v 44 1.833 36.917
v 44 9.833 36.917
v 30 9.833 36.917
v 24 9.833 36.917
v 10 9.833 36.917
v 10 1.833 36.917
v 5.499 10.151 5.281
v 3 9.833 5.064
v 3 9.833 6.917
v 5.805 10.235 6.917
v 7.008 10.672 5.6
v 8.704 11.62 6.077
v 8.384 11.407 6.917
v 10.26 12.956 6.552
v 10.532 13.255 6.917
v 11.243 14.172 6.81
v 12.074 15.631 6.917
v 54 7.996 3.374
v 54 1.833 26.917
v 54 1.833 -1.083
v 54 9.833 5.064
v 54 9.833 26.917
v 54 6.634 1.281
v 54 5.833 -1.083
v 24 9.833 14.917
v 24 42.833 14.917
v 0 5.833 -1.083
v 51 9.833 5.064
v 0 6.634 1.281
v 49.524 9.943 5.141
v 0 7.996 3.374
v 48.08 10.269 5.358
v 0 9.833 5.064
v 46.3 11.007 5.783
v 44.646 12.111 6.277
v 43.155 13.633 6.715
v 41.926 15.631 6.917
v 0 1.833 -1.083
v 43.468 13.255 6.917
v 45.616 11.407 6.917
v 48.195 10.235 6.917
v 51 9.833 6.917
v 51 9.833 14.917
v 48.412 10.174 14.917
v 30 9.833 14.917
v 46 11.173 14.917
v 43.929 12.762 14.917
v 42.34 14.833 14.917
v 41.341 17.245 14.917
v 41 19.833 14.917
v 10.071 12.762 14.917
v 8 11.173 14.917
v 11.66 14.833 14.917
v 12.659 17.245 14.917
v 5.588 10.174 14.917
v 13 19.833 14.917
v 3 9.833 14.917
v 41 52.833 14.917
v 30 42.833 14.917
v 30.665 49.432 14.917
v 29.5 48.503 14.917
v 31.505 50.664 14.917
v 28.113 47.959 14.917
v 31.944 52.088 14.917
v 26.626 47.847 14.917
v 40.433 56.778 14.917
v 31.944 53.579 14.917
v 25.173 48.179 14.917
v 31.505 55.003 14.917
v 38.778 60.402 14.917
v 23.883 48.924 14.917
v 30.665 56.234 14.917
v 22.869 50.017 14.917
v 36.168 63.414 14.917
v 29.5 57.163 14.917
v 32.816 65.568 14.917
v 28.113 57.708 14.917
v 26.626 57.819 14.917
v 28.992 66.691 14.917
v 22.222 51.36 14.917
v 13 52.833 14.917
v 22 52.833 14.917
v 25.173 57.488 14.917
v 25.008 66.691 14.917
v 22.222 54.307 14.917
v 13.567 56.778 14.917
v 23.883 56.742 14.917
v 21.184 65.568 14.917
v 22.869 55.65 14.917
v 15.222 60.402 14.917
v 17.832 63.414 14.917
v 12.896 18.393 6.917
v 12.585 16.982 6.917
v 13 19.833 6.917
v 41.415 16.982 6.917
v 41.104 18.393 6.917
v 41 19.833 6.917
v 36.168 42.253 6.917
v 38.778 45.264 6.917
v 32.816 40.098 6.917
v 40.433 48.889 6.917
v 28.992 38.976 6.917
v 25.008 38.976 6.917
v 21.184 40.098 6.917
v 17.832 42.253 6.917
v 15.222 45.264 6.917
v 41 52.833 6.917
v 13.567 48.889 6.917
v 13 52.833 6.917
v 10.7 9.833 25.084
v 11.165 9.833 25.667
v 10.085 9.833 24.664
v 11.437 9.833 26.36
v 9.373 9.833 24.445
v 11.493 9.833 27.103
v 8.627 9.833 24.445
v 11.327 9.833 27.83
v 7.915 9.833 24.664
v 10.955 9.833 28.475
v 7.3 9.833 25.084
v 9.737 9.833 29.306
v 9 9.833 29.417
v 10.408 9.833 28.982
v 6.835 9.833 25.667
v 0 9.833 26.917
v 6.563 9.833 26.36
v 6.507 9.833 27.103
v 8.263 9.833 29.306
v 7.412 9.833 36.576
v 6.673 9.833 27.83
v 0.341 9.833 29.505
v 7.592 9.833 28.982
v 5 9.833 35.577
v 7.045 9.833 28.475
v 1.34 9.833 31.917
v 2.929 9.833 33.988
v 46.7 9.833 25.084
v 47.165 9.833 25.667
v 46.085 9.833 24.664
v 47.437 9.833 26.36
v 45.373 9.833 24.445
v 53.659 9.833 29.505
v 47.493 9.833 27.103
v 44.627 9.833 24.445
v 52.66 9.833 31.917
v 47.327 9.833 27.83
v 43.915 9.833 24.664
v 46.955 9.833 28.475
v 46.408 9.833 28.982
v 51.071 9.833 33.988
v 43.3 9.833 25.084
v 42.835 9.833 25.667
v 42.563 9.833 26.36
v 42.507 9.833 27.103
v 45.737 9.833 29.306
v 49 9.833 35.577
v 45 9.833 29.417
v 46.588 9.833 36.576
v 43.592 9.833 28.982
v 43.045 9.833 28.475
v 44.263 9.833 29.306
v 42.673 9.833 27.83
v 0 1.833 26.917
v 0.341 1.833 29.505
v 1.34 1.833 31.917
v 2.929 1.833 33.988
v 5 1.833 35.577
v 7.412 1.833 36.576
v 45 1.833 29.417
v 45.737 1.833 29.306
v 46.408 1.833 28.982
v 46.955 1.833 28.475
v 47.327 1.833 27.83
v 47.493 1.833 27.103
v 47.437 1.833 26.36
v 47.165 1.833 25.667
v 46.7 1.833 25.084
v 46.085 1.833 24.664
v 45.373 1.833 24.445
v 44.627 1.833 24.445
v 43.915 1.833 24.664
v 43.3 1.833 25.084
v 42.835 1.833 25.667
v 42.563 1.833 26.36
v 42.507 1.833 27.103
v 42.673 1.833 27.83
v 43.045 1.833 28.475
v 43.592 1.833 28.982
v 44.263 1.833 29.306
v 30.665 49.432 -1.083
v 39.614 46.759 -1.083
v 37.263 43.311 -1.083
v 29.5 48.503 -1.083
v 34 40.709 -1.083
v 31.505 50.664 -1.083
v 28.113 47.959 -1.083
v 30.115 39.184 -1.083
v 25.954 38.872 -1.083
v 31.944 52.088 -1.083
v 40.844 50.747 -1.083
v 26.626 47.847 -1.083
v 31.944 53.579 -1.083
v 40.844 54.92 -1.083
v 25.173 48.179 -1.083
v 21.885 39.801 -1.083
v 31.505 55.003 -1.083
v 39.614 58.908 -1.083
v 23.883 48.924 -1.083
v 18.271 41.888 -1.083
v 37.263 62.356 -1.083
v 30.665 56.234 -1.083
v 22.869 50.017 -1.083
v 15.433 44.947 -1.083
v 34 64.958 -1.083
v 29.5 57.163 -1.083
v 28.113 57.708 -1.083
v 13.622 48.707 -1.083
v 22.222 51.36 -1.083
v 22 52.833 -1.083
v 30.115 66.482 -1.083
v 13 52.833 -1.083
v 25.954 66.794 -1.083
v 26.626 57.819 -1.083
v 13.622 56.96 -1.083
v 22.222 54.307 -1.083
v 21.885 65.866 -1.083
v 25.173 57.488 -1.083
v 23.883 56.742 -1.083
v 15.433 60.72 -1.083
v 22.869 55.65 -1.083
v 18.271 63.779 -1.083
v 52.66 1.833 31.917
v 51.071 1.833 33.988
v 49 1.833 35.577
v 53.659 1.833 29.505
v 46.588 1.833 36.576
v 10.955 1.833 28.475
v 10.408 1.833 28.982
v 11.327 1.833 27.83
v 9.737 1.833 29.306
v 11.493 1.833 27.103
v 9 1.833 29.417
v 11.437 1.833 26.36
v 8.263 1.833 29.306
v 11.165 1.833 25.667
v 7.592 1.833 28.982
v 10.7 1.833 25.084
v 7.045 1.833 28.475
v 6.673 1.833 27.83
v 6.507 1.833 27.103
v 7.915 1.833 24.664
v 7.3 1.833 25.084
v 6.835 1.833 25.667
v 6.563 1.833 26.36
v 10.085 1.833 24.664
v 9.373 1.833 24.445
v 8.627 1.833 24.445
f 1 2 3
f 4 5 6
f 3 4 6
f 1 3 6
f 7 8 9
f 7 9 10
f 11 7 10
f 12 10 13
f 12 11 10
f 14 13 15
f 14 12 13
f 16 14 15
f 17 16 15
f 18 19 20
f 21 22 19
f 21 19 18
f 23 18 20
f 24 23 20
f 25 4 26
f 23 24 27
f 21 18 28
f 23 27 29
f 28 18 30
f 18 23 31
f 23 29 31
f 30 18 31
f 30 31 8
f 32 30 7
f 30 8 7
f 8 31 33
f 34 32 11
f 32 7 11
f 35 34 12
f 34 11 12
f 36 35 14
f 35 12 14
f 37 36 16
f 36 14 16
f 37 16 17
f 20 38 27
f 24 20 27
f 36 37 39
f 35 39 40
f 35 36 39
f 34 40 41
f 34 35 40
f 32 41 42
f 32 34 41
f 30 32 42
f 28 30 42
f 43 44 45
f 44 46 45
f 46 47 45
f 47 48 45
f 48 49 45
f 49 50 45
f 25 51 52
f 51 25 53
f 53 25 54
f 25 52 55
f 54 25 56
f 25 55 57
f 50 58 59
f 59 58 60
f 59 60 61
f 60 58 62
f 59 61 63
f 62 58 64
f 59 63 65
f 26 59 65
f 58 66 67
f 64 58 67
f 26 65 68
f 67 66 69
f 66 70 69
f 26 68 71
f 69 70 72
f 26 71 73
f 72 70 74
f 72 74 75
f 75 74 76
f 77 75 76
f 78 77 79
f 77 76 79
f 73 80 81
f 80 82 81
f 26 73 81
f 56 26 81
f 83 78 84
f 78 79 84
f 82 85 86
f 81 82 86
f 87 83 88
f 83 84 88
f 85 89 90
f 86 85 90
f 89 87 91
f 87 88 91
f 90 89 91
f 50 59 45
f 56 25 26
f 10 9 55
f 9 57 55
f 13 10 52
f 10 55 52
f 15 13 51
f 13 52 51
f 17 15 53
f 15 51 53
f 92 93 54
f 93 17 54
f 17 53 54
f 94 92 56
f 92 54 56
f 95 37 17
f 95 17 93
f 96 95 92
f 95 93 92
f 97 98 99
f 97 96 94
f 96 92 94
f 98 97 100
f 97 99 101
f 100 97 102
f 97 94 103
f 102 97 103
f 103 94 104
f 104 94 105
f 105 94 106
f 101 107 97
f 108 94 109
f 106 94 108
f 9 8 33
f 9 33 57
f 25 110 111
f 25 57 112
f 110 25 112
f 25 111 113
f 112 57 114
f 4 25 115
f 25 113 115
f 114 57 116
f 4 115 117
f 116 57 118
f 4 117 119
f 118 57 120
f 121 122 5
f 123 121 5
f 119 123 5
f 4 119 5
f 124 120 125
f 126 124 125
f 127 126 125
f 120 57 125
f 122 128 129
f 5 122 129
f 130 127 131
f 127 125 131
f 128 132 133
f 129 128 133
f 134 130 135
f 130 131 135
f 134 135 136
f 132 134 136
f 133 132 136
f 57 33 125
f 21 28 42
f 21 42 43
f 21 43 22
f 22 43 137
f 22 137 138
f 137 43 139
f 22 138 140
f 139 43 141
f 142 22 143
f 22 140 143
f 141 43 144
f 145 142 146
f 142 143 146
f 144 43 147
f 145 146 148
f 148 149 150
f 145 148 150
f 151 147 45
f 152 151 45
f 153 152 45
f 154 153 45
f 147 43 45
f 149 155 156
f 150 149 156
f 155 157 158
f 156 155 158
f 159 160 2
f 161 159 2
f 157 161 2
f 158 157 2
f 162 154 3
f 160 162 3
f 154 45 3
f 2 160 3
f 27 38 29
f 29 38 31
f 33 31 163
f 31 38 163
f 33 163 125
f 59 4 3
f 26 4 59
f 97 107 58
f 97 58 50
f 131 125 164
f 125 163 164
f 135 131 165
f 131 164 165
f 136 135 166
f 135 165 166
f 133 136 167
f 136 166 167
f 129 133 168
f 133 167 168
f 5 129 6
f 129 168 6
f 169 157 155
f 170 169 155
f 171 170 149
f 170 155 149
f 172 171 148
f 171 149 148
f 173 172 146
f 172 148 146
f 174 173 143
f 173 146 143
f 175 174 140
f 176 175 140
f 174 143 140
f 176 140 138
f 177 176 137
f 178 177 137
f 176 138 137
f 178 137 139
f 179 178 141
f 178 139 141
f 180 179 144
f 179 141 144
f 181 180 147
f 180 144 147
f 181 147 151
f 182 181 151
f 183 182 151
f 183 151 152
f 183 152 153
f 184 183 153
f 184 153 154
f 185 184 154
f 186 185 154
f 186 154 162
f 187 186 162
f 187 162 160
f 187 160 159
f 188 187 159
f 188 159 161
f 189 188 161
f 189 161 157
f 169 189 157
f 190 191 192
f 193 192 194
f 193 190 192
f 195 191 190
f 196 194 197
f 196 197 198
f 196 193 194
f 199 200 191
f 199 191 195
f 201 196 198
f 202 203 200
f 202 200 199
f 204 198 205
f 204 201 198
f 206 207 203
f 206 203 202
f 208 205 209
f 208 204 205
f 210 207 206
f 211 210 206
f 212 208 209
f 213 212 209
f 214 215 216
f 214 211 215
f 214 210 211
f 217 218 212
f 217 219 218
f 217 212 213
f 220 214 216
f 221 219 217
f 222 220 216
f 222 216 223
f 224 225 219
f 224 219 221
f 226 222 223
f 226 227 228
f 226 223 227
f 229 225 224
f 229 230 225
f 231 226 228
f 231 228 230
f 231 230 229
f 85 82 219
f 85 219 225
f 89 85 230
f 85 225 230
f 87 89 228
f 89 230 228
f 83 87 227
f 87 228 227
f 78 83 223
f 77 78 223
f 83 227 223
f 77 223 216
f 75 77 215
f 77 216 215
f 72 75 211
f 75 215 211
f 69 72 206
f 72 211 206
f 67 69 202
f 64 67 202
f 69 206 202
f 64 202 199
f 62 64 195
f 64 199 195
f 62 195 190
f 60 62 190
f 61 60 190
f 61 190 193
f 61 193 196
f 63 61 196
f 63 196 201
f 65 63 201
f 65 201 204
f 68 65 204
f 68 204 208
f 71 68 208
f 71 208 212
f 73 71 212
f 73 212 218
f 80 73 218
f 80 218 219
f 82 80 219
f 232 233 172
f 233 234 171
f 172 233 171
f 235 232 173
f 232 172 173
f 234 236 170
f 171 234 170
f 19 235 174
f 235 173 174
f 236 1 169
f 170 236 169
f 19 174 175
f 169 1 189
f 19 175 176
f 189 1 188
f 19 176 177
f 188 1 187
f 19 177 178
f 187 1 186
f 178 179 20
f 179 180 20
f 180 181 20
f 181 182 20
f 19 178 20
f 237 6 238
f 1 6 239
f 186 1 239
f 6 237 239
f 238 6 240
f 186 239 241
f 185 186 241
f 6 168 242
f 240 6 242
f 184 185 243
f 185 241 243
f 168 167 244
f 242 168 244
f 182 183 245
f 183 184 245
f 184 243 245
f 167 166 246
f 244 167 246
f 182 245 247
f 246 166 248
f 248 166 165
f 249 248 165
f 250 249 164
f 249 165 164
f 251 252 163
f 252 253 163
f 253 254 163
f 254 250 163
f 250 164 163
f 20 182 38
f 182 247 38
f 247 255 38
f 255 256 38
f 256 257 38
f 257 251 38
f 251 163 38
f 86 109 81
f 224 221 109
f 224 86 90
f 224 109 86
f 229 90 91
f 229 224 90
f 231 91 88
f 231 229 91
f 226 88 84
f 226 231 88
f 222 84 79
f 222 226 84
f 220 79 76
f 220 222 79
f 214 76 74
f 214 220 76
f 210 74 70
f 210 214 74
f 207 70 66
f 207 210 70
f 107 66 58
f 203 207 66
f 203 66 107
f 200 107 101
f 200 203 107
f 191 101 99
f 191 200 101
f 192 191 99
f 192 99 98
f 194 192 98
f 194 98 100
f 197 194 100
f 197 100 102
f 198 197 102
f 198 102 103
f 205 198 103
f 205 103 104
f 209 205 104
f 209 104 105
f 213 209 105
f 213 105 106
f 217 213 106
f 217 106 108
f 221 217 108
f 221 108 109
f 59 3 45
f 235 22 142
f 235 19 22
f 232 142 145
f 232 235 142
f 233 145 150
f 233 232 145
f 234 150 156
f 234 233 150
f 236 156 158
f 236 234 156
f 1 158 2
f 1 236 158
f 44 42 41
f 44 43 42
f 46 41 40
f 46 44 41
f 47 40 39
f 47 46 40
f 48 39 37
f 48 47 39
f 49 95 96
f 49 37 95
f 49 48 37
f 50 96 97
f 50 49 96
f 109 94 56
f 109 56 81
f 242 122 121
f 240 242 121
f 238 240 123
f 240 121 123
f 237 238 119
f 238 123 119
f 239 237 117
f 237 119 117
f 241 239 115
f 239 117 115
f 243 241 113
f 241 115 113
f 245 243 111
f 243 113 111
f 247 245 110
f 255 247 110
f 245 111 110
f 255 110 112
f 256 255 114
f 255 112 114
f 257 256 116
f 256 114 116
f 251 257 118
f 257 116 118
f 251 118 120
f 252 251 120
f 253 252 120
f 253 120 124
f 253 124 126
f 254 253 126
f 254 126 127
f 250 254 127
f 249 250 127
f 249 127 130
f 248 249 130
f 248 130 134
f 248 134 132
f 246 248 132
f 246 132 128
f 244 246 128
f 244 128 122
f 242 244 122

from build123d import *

# Parameters (mm, degrees)
Y_KSEKLIK_EKSTR_ZYON1_DEPTH = 54
IZIM2_R                     = 5
Y_KSEKLIK_EKSTR_ZYON2_DEPTH = 8
FEDER2_REACH                = 82.985
IZIM6_WALL_W                = 203.630625642
IZIM6_WALL_H                = 6
Y_KSEKLIK_EKSTR_ZYON3_START = 8
IZIM7_R                     = 14
IZIM7_R_2                   = 5
Y_KSEKLIK_EKSTR_ZYON3_DEPTH = 8
RADYUS1_R                   = 10
RADYUS2_START               = 13.0000001
RADYUS2_DEPTH               = 27.9999998
RADYUS2_2_DEPTH             = 54
RADYUS2_START_2             = -1.083333333
RADYUS2_3_DEPTH             = 8
RADYUS3_R                   = 10
IZIM9_R                     = 2.5
KES_EKSTR_ZYON1_DEPTH       = 87.763127471


with BuildPart() as part:
    # Çizim1 → Yükseklik-Ekstrüzyon1 (new body)
    with BuildSketch(Plane(origin=(0, 0, 0), x_dir=(0, 0, -1), z_dir=(1, 0, 0))):
        Polygon((-6.916666667, 9.833333333), (-36.916666667, 9.833333333), (-36.916666667, 1.833333333), (-19.333333333, 1.833333333), (1.083333333, 1.833333333), (1.083333333, 5.833333333), (-6.916666667, 5.833333333), align=None)
    extrude(amount=Y_KSEKLIK_EKSTR_ZYON1_DEPTH)

    # Çizim2 → Yükseklik-Ekstrüzyon2 (add)
    with BuildSketch(Plane(origin=(0, 0, 6.916666667), x_dir=(-1, 0, 0), z_dir=(0, 0, -1))):
        with BuildLine():
            ThreePointArc((-13, 52.833333333), (-27, 66.833333333), (-41, 52.833333333))
            Line((-41, 52.833333333), (-41, 9.833333333))
            Line((-41, 9.833333333), (-13, 9.833333333))
            Line((-13, 9.833333333), (-13, 52.833333333))
        make_face()
        with Locations((-27, 52.833333333)):
            Circle(IZIM2_R, mode=Mode.SUBTRACT)
    extrude(amount=-Y_KSEKLIK_EKSTR_ZYON2_DEPTH)

    # Çizim6 wall → Feder2 (add, up to next)
    with BuildSketch(Plane(origin=(27, 26.333333333, 25.916666667), x_dir=(0, 0.832050294338, -0.554700196225), z_dir=(0, 0.554700196225, 0.832050294338)), mode=Mode.PRIVATE) as feder2_sk1:
        Rectangle(IZIM6_WALL_W, IZIM6_WALL_H)
    feder2_tool1 = extrude(feder2_sk1.sketch, amount=-FEDER2_REACH, mode=Mode.PRIVATE) - part.part
    add(feder2_tool1.solids().sort_by_distance((27, 26.333333333, 25.916666667))[0])

    # Çizim7 → Yükseklik-Ekstrüzyon3 (add)
    with BuildSketch(Plane(origin=(0, 0, 6.916666667), x_dir=(-1, 0, 0), z_dir=(0, 0, -1)).offset(Y_KSEKLIK_EKSTR_ZYON3_START)):
        with Locations((-27, 52.833333333)):
            Circle(IZIM7_R)
        with Locations((-27, 52.833333333)):
            Circle(IZIM7_R_2, mode=Mode.SUBTRACT)
    extrude(amount=-Y_KSEKLIK_EKSTR_ZYON3_DEPTH)

    # Radyus1
    radyus1_edges = [part.edges().sort_by_distance(p)[0] for p in [
        (13, 9.833333333, 10.916666667),
        (41, 9.833333333, 10.916666667),
    ]]
    fillet(radyus1_edges, radius=RADYUS1_R)

    # Radyus2: read off the stored shape, not the designer's step
    # Radyus2 outline → Radyus2 (add)
    with BuildSketch(Plane.YZ.offset(RADYUS2_START)):
        with BuildLine():
            Line((5.833333333, 6.916666667), (5.833333333, -1.083333333))
            ThreePointArc((5.833333333, -1.083333333), (9.306736984, 4.662633359), (15.631292304, 6.916666667))
            Line((15.631292304, 6.916666667), (5.833333333, 6.916666667))
        make_face()
    extrude(amount=RADYUS2_DEPTH)

    # Radyus2 2 outline → Radyus2 2 (add)
    with BuildSketch(Plane.YZ):
        with BuildLine():
            Line((5.833333333, 6.916666667), (5.833333333, -1.083333333))
            ThreePointArc((5.833333333, -1.083333333), (9.306736984, 4.662633359), (15.631292304, 6.916666667))
            Line((15.631292304, 6.916666667), (5.833333333, 6.916666667))
        make_face()
    extrude(amount=RADYUS2_2_DEPTH)

    # Radyus2 3 outline → Radyus2 3 (cut)
    with BuildSketch(Plane.XY.offset(RADYUS2_START_2)):
        with BuildLine():
            Line((-1, 9.833333333), (3, 9.833333333))
            ThreePointArc((3, 9.833333333), (8.986094999, 11.822923439), (12.590214921, 17))
            Line((12.590214921, 17), (-1, 17))
            Line((-1, 17), (-1, 9.833333333))
        make_face()
        with BuildLine():
            Line((55, 17), (41.409785079, 17))
            ThreePointArc((41.409785079, 17), (45.013905001, 11.822923439), (51, 9.833333333))
            Line((51, 9.833333333), (55, 9.833333333))
            Line((55, 9.833333333), (55, 17))
        make_face()
    extrude(amount=RADYUS2_3_DEPTH, mode=Mode.SUBTRACT)

    # Radyus3
    radyus3_edges = [part.edges().sort_by_distance(p)[0] for p in [
        (54, 5.833333333, 36.916666667),
        (0, 5.833333333, 36.916666667),
    ]]
    fillet(radyus3_edges, radius=RADYUS3_R)

    # Çizim9 → Kes-Ekstrüzyon1 (cut, through all)
    with BuildSketch(Plane(origin=(0, 9.833333333, 0), x_dir=(1, 0, 0), z_dir=(0, 1, 0))):
        with Locations(Location((9, -26.916666667, 0), (0, 0, 270))):
            Circle(IZIM9_R)
        with Locations(Location((45, -26.916666667, 0), (0, 0, 270))):
            Circle(IZIM9_R)
    extrude(amount=-KES_EKSTR_ZYON1_DEPTH, mode=Mode.SUBTRACT)


solid = part.part
